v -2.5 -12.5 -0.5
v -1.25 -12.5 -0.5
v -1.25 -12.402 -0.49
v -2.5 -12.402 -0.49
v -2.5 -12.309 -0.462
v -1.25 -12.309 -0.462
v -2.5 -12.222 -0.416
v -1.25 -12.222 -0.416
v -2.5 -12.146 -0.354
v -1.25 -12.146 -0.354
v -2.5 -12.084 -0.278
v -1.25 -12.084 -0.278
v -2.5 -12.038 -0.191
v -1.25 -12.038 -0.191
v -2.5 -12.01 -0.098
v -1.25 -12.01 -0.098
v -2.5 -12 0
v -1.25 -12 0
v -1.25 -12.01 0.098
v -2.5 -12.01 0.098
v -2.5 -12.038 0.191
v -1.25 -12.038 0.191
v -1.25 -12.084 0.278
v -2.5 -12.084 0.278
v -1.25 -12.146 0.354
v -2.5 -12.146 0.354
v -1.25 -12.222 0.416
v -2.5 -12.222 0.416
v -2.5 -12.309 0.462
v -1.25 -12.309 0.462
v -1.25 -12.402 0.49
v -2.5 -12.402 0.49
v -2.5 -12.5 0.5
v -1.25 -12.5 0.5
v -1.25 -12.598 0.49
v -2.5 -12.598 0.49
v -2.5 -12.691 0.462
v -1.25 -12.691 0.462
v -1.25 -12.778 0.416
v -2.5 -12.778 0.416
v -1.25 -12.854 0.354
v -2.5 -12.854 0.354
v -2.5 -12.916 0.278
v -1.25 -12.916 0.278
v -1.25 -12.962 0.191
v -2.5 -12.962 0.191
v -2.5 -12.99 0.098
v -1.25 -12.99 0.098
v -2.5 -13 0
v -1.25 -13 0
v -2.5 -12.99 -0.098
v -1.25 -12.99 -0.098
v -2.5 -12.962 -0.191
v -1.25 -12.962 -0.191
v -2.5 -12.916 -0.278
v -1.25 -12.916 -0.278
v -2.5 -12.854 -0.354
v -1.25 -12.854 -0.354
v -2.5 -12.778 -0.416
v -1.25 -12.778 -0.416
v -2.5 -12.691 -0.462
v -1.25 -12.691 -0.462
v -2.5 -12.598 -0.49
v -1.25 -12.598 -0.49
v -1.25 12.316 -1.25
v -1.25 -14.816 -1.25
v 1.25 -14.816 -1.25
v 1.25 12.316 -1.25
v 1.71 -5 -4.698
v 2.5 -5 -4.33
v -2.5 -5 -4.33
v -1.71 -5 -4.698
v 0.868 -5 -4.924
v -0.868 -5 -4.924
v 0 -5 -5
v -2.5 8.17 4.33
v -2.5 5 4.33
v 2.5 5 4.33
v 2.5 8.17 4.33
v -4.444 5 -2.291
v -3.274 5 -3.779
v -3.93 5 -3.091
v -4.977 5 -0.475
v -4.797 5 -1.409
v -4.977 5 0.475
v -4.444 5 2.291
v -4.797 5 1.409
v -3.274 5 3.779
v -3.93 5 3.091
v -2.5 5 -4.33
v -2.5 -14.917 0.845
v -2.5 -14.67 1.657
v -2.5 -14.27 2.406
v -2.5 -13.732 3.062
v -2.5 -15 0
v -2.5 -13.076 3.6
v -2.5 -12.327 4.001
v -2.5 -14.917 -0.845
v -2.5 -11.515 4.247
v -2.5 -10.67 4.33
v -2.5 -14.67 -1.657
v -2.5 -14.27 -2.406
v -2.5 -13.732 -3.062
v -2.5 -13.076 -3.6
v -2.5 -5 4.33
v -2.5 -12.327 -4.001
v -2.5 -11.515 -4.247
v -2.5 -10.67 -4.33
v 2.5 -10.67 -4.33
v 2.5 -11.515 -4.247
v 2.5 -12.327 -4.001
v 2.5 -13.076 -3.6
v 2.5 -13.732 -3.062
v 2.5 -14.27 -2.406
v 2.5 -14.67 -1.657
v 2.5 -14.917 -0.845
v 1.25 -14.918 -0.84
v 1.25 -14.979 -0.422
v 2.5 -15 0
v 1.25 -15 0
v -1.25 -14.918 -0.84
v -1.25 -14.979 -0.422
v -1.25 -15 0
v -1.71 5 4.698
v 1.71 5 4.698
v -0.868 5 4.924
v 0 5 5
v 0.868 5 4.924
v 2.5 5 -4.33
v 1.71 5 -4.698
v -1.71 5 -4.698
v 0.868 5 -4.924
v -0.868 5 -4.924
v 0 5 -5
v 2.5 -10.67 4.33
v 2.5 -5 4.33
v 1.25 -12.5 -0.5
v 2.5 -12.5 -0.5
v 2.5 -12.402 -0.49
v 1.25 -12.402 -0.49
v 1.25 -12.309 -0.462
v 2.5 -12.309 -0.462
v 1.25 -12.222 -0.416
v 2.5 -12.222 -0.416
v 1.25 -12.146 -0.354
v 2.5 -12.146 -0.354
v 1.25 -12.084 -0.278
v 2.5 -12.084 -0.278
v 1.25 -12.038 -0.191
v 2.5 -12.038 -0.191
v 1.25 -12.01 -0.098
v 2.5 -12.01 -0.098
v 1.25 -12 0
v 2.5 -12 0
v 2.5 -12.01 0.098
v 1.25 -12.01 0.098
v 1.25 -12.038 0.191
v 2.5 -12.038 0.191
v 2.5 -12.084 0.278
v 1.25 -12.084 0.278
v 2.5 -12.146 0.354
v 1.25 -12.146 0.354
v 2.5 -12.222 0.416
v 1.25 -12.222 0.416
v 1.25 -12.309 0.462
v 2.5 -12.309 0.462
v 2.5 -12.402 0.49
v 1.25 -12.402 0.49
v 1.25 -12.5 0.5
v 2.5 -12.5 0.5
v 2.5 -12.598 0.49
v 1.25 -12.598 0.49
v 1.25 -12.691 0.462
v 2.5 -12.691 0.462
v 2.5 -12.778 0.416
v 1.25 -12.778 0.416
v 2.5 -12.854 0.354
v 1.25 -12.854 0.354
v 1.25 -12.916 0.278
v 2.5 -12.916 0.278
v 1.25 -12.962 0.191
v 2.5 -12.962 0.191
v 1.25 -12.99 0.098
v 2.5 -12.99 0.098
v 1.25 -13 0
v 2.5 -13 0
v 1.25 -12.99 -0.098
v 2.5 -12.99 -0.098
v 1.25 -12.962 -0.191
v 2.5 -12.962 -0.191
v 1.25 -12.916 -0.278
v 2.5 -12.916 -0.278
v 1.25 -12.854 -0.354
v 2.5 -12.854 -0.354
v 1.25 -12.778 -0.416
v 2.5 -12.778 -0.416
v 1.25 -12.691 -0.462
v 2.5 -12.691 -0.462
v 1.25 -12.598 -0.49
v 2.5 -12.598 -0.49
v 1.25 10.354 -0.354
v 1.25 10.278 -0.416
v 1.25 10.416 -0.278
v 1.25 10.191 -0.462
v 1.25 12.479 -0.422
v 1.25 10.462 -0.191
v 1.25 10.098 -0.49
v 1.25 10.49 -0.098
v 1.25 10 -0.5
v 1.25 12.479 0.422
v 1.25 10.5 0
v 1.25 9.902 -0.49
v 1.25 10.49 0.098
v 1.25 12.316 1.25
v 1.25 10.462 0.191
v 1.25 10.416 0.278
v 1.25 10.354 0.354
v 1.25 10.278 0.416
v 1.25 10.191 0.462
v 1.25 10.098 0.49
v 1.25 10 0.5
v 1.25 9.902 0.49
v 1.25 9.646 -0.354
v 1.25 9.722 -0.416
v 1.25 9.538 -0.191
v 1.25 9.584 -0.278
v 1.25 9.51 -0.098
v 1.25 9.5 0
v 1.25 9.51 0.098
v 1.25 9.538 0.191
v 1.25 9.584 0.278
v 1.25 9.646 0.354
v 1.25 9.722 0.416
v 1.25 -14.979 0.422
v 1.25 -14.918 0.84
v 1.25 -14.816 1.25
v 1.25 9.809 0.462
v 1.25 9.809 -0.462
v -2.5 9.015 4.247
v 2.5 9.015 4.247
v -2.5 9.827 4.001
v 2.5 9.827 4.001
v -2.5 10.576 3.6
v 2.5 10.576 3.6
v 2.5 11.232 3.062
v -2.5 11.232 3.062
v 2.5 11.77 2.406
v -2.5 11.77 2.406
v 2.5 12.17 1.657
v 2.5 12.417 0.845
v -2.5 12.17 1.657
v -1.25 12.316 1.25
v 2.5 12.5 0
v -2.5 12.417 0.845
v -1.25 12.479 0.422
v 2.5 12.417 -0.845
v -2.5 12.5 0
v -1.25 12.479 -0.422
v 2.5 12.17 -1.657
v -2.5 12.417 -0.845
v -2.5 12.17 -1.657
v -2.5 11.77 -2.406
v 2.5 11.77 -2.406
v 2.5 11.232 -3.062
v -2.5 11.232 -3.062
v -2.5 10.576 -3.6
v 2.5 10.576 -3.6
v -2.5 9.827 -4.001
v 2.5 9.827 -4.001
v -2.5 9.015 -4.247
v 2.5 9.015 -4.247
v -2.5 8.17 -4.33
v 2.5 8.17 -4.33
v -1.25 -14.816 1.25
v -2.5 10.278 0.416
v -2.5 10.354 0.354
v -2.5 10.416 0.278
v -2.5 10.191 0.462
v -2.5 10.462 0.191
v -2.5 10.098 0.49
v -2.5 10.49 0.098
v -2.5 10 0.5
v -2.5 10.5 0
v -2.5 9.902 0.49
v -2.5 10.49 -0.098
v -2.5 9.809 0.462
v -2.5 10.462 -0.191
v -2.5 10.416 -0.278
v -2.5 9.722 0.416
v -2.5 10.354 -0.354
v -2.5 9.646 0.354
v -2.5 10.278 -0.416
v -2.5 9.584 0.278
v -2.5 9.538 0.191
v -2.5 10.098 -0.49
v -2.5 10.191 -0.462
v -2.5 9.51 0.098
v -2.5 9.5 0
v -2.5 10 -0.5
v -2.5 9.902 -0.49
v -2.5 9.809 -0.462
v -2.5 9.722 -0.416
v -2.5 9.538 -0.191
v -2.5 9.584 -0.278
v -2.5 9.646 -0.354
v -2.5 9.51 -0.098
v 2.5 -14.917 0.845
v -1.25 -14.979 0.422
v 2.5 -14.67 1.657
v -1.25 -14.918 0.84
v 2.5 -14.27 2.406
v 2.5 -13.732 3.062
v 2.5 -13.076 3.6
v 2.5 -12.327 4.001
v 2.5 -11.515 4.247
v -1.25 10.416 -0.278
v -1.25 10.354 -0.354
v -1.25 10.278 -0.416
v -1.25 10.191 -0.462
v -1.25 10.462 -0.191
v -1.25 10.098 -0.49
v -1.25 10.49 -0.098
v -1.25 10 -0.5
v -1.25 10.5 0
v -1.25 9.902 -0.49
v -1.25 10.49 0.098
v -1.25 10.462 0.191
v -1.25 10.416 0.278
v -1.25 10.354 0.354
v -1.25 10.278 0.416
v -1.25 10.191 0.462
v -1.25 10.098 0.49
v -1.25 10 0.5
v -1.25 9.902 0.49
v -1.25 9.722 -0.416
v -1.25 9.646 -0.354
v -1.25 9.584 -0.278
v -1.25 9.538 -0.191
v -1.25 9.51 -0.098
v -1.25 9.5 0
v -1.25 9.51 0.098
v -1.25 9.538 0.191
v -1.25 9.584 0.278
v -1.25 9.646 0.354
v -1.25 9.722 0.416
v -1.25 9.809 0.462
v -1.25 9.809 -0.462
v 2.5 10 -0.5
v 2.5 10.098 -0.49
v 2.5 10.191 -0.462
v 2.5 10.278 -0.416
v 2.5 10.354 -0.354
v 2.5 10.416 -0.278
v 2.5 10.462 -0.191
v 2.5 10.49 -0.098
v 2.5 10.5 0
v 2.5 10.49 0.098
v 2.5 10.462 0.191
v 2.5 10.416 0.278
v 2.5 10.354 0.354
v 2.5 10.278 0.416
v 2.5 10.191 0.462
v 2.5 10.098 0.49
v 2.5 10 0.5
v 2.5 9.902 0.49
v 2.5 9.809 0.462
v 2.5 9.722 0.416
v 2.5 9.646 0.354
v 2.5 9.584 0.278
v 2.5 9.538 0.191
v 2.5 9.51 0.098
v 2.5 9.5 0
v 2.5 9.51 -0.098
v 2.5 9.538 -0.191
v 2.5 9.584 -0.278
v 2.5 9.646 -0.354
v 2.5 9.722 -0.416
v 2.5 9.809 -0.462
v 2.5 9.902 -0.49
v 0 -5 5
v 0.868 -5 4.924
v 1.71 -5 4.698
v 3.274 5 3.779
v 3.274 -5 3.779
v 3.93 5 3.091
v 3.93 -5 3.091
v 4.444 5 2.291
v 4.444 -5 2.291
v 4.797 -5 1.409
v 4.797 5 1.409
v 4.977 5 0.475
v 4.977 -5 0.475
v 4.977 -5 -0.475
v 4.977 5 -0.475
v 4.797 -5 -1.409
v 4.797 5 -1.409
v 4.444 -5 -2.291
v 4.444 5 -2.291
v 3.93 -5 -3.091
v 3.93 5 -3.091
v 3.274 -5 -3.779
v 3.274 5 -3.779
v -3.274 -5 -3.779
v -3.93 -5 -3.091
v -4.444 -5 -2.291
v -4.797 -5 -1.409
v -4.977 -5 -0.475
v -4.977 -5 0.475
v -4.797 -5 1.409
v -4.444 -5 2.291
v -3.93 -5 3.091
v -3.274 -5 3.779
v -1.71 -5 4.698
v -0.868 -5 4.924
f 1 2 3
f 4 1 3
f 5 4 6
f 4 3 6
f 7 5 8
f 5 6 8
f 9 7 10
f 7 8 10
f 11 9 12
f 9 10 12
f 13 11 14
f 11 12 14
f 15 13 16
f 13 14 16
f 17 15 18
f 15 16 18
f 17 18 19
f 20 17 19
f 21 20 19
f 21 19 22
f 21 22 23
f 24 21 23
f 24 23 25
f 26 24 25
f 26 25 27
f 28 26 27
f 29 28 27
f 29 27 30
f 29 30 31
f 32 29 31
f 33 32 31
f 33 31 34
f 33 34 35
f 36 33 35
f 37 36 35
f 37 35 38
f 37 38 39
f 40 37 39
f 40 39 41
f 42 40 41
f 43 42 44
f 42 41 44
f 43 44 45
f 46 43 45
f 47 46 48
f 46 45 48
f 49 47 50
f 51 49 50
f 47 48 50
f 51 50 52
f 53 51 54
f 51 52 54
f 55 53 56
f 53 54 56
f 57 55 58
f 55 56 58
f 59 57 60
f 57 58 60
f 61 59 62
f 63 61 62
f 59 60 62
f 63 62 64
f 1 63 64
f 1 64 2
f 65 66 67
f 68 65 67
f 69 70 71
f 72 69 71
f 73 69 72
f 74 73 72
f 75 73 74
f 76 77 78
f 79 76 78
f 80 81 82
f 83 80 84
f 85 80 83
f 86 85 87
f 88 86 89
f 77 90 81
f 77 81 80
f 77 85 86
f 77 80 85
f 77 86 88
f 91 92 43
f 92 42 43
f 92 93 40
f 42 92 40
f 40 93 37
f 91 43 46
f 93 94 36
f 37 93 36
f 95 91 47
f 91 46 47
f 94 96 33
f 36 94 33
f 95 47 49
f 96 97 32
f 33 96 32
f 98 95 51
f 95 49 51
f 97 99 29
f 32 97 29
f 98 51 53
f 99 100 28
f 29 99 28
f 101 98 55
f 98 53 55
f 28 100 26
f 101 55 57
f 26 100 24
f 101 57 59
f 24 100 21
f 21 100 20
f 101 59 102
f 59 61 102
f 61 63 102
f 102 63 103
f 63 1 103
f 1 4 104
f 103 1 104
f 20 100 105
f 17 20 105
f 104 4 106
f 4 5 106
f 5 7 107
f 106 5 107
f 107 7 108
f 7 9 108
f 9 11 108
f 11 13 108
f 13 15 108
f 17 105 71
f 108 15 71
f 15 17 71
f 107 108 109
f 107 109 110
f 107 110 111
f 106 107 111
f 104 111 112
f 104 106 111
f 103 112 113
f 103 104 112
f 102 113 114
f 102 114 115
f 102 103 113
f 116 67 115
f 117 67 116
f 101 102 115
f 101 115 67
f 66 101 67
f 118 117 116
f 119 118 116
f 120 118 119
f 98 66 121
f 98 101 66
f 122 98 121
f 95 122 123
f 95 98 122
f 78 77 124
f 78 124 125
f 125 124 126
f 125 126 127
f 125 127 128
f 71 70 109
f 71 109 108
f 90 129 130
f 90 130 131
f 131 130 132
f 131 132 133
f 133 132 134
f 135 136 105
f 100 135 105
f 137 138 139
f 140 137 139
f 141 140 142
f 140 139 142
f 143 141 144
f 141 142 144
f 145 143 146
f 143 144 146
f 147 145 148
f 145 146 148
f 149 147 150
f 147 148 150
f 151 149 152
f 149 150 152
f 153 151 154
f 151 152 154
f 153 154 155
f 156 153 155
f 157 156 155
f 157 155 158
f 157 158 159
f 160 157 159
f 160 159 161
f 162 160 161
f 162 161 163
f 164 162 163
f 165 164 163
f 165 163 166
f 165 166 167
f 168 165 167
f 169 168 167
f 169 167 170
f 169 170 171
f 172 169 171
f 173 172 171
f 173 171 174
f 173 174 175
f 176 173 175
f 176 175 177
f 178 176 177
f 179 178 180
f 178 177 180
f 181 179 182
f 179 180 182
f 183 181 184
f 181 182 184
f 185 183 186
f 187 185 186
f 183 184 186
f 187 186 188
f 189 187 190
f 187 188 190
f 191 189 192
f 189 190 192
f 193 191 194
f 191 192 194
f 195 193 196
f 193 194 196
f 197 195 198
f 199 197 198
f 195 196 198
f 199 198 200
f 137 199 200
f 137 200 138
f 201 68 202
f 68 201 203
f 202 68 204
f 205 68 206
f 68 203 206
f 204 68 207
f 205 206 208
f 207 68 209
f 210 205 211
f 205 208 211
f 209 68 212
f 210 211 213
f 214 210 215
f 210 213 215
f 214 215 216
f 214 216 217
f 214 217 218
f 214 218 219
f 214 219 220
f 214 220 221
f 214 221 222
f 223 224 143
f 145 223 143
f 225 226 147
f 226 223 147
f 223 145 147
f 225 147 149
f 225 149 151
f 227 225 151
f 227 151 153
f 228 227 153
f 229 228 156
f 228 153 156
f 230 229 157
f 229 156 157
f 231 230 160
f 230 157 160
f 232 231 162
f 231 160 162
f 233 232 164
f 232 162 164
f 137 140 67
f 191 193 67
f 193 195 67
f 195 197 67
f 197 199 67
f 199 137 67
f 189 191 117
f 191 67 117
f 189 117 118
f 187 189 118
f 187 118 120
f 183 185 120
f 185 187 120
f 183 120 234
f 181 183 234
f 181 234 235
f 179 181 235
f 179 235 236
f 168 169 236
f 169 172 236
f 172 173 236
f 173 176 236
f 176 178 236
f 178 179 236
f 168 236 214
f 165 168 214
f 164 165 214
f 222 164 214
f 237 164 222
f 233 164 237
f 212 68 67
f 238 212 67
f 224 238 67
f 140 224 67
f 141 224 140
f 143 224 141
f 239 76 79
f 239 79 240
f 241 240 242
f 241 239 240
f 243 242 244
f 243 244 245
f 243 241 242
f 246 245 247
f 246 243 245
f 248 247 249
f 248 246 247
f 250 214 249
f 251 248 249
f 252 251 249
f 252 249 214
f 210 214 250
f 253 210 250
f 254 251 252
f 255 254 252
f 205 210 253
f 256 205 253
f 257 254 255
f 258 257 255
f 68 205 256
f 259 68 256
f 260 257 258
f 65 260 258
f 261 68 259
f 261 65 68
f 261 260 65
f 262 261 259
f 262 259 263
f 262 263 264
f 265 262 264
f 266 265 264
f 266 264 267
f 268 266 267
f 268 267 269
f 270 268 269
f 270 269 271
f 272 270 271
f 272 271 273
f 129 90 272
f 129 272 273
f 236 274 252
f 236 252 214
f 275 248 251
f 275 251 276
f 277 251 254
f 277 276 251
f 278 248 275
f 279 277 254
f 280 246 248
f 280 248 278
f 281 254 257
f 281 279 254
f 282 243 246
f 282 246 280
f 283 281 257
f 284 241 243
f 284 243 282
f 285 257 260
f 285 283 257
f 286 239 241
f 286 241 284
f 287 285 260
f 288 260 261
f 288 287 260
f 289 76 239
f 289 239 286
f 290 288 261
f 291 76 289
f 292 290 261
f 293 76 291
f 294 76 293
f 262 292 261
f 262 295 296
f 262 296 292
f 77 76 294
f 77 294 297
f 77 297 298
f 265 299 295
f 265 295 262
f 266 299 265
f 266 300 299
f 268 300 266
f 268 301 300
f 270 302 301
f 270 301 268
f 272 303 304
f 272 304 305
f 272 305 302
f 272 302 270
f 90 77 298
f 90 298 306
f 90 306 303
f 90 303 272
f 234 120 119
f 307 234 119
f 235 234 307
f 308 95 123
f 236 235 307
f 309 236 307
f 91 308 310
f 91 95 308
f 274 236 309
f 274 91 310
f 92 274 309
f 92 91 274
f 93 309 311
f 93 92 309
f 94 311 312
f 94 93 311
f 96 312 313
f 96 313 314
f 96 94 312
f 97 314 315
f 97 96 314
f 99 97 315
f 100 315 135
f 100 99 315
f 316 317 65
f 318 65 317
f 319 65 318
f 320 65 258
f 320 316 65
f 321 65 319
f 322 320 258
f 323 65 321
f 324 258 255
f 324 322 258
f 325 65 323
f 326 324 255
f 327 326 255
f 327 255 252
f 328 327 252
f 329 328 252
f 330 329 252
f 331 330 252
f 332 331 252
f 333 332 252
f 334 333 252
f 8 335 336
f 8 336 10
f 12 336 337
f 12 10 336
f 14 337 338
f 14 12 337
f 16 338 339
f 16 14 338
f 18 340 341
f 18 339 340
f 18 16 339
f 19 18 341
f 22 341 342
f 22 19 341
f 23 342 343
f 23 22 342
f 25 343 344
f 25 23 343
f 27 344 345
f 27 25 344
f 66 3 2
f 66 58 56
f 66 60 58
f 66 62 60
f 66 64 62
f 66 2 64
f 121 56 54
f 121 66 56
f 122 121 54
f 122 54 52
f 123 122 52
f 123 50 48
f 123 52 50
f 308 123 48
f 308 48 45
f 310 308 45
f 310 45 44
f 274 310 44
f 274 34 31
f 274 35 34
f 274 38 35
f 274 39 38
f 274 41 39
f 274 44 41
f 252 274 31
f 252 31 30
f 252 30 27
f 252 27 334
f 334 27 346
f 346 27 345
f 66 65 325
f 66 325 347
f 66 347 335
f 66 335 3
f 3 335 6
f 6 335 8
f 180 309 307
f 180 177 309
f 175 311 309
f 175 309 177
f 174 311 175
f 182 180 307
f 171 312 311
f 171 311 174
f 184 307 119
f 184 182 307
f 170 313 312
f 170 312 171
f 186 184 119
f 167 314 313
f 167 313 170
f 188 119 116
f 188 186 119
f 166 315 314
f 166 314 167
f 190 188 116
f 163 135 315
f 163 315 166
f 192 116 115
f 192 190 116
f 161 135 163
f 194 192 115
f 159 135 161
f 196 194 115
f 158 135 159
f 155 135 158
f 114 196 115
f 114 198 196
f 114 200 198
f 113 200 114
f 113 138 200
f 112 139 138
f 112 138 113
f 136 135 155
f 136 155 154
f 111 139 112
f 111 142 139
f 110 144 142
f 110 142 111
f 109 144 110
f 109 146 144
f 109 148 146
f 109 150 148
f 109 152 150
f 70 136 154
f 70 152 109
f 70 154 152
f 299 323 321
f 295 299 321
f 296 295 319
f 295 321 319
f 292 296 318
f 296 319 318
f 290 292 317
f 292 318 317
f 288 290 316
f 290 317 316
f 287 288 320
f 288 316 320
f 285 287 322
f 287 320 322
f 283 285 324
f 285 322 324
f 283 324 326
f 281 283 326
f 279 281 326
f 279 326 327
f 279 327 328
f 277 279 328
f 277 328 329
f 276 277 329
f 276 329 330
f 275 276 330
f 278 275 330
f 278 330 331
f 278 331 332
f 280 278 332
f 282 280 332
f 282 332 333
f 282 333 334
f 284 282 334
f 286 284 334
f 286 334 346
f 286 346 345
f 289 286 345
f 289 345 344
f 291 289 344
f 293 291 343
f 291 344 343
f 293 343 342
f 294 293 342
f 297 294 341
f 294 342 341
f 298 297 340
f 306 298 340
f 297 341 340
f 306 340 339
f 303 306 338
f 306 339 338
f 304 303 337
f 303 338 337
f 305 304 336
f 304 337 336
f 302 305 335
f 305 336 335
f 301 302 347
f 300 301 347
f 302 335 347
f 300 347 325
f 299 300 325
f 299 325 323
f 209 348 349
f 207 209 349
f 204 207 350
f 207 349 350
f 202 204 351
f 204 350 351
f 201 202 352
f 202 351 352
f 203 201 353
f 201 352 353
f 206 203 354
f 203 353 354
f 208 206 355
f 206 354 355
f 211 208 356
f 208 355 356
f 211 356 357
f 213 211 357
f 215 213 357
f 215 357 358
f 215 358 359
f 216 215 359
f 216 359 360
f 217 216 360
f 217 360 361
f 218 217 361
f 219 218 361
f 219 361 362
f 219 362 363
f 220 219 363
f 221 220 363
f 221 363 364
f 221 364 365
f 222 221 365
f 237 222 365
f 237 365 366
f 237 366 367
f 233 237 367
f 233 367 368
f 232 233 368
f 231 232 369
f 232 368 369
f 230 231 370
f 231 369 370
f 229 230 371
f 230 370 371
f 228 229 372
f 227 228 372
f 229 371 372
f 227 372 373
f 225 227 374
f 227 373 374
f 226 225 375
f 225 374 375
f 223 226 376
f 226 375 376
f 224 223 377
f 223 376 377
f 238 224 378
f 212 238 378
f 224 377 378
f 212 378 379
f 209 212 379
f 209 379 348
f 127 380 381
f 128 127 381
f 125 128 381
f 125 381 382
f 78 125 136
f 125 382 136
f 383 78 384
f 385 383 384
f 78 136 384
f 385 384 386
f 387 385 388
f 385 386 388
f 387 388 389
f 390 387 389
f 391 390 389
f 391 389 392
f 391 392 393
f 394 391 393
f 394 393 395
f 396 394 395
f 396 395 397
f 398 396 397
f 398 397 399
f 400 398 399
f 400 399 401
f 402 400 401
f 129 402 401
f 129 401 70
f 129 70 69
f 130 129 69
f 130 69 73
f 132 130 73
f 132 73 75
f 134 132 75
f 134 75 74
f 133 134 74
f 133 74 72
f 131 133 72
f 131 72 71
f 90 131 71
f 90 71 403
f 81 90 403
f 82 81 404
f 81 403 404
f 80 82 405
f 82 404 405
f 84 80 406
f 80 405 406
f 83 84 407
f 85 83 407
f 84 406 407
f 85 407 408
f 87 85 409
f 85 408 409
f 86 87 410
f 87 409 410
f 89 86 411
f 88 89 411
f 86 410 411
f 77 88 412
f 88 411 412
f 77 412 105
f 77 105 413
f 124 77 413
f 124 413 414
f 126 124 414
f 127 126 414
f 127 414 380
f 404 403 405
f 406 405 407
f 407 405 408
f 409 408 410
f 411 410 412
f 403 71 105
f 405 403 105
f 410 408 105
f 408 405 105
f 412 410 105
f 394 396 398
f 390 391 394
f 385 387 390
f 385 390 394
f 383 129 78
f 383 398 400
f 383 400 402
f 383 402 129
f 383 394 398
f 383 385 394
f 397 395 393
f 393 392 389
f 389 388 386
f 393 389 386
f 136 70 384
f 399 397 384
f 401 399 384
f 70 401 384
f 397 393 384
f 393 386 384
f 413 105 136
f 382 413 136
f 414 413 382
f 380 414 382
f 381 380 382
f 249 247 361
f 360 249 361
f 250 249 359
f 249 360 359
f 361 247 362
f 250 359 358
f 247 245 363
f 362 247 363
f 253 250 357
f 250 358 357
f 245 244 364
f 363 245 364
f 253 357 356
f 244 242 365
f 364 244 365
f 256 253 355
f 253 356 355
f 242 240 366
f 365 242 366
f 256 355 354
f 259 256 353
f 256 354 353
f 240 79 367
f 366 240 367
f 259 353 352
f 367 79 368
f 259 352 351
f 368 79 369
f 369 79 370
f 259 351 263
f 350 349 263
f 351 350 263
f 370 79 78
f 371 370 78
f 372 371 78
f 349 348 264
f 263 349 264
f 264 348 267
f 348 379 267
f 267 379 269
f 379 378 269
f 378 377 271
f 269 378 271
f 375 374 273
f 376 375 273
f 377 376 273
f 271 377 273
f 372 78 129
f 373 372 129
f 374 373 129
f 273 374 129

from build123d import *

# Parameters (mm, degrees)
BOSS_EXTRUDE1_DEPTH              = 5
BOSS_EXTRUDE1_DEPTH_BACK         = 5
SKETCH1_R                        = 5
SKETCH2_W                        = 5
SKETCH2_H                        = 8.660254038
BOSS_EXTRUDE2_DEPTH              = 10
CUT_EXTRUDE1_DEPTH               = 10
F_95_0_03937008_DIAMETER_HOLE1_D = 1.000000032
CUT_EXTRUDE2_DEPTH               = 10
CUT_EXTRUDE2_DEPTH_BACK          = 22.213203436
SKETCH7_W                        = 2.5
SKETCH7_H                        = 2.5
SKETCH8_W                        = 5
SKETCH8_H                        = 8.660254038
BOSS_EXTRUDE3_DEPTH              = 7.5
CUT_EXTRUDE3_DEPTH               = 7.5
F_95_0_03937008_DIAMETER_HOLE2_D = 1.000000032
SKETCH13_W                       = 2.5
SKETCH13_H                       = 2.5
CUT_EXTRUDE4_DEPTH               = 7.5


with BuildPart() as part:
    # Sketch1 → Boss-Extrude1 (new, two sides: drawn at the far end of the back side and taken through both)
    with BuildSketch(Plane(origin=(0, 0, 0), x_dir=(1, 0, 0), z_dir=(0, 1, 0)).offset(-BOSS_EXTRUDE1_DEPTH_BACK)):
        Circle(SKETCH1_R)
    extrude(amount=BOSS_EXTRUDE1_DEPTH + BOSS_EXTRUDE1_DEPTH_BACK)

    # Sketch2 → Boss-Extrude2 (add)
    with BuildSketch(Plane(origin=(0, -5, 0), x_dir=(-1, 0, 0), z_dir=(0, -1, 0))):
        Rectangle(SKETCH2_W, SKETCH2_H)
    extrude(amount=BOSS_EXTRUDE2_DEPTH)

    # Sketch3 → Cut-Extrude1 (cut)
    with BuildSketch(Plane.ZY.offset(2.5)):
        with BuildLine():
            Line((4.330127019, -10.66987298), (5.842852499, -10.66987298))
            Line((5.842852499, -10.66987298), (5.842852499, -18.914150706))
            Line((5.842852499, -18.914150706), (-6.856243272, -18.914150706))
            Line((-6.856243272, -18.914150706), (-6.856243272, -10.66987298))
            Line((-6.856243272, -10.66987298), (-4.330127019, -10.66987298))
            ThreePointArc((-4.330127019, -10.66987298), (-3.061862179, -13.731735159), (0, -15))
            ThreePointArc((0, -15), (3.061862179, -13.731735159), (4.330127019, -10.66987298))
        make_face()
    extrude(amount=-CUT_EXTRUDE1_DEPTH, mode=Mode.SUBTRACT)

    # #95 (0.03937008) Diameter Hole1 (through all)
    with Locations(Plane.ZY.offset(2.5)):
        with Locations((0, -12.499999999)):
            Hole(F_95_0_03937008_DIAMETER_HOLE1_D / 2)

    # Sketch7 → Cut-Extrude2 (cut, two sides: drawn at the far end of the back side and taken through both)
    with BuildSketch(Plane(origin=(0, 5, 0), x_dir=(1, 0, 0), z_dir=(0, 1, 0)).offset(-CUT_EXTRUDE2_DEPTH_BACK)):
        Rectangle(SKETCH7_W, SKETCH7_H)
    extrude(amount=CUT_EXTRUDE2_DEPTH + CUT_EXTRUDE2_DEPTH_BACK, mode=Mode.SUBTRACT)

    # Sketch8 → Boss-Extrude3 (add)
    with BuildSketch(Plane(origin=(0, 5, 0), x_dir=(1, 0, 0), z_dir=(0, 1, 0))):
        Rectangle(SKETCH8_W, SKETCH8_H)
    extrude(amount=BOSS_EXTRUDE3_DEPTH)

    # Sketch9 → Cut-Extrude3 (cut)
    with BuildSketch(Plane.ZY.offset(2.5)):
        with BuildLine():
            Line((-4.330127019, 8.16987298), (-5.309333273, 8.16987298))
            Line((-5.309333273, 8.16987298), (-5.309333273, 13.114789022))
            Line((-5.309333273, 13.114789022), (5.138804432, 13.114789022))
            Line((5.138804432, 13.114789022), (5.138804432, 8.16987298))
            Line((5.138804432, 8.16987298), (4.330127019, 8.16987298))
            ThreePointArc((4.330127019, 8.16987298), (0, 12.499999999), (-4.330127019, 8.16987298))
        make_face()
    extrude(amount=-CUT_EXTRUDE3_DEPTH, mode=Mode.SUBTRACT)

    # #95 (0.03937008) Diameter Hole2 (through all)
    with Locations(Plane.ZY.offset(2.5)):
        with Locations((0, 9.999999999)):
            Hole(F_95_0_03937008_DIAMETER_HOLE2_D / 2)

    # Sketch13 → Cut-Extrude4 (cut)
    with BuildSketch(Plane.XZ.offset(-5)):
        Rectangle(SKETCH13_W, SKETCH13_H)
    extrude(amount=-CUT_EXTRUDE4_DEPTH, mode=Mode.SUBTRACT)


solid = part.part
